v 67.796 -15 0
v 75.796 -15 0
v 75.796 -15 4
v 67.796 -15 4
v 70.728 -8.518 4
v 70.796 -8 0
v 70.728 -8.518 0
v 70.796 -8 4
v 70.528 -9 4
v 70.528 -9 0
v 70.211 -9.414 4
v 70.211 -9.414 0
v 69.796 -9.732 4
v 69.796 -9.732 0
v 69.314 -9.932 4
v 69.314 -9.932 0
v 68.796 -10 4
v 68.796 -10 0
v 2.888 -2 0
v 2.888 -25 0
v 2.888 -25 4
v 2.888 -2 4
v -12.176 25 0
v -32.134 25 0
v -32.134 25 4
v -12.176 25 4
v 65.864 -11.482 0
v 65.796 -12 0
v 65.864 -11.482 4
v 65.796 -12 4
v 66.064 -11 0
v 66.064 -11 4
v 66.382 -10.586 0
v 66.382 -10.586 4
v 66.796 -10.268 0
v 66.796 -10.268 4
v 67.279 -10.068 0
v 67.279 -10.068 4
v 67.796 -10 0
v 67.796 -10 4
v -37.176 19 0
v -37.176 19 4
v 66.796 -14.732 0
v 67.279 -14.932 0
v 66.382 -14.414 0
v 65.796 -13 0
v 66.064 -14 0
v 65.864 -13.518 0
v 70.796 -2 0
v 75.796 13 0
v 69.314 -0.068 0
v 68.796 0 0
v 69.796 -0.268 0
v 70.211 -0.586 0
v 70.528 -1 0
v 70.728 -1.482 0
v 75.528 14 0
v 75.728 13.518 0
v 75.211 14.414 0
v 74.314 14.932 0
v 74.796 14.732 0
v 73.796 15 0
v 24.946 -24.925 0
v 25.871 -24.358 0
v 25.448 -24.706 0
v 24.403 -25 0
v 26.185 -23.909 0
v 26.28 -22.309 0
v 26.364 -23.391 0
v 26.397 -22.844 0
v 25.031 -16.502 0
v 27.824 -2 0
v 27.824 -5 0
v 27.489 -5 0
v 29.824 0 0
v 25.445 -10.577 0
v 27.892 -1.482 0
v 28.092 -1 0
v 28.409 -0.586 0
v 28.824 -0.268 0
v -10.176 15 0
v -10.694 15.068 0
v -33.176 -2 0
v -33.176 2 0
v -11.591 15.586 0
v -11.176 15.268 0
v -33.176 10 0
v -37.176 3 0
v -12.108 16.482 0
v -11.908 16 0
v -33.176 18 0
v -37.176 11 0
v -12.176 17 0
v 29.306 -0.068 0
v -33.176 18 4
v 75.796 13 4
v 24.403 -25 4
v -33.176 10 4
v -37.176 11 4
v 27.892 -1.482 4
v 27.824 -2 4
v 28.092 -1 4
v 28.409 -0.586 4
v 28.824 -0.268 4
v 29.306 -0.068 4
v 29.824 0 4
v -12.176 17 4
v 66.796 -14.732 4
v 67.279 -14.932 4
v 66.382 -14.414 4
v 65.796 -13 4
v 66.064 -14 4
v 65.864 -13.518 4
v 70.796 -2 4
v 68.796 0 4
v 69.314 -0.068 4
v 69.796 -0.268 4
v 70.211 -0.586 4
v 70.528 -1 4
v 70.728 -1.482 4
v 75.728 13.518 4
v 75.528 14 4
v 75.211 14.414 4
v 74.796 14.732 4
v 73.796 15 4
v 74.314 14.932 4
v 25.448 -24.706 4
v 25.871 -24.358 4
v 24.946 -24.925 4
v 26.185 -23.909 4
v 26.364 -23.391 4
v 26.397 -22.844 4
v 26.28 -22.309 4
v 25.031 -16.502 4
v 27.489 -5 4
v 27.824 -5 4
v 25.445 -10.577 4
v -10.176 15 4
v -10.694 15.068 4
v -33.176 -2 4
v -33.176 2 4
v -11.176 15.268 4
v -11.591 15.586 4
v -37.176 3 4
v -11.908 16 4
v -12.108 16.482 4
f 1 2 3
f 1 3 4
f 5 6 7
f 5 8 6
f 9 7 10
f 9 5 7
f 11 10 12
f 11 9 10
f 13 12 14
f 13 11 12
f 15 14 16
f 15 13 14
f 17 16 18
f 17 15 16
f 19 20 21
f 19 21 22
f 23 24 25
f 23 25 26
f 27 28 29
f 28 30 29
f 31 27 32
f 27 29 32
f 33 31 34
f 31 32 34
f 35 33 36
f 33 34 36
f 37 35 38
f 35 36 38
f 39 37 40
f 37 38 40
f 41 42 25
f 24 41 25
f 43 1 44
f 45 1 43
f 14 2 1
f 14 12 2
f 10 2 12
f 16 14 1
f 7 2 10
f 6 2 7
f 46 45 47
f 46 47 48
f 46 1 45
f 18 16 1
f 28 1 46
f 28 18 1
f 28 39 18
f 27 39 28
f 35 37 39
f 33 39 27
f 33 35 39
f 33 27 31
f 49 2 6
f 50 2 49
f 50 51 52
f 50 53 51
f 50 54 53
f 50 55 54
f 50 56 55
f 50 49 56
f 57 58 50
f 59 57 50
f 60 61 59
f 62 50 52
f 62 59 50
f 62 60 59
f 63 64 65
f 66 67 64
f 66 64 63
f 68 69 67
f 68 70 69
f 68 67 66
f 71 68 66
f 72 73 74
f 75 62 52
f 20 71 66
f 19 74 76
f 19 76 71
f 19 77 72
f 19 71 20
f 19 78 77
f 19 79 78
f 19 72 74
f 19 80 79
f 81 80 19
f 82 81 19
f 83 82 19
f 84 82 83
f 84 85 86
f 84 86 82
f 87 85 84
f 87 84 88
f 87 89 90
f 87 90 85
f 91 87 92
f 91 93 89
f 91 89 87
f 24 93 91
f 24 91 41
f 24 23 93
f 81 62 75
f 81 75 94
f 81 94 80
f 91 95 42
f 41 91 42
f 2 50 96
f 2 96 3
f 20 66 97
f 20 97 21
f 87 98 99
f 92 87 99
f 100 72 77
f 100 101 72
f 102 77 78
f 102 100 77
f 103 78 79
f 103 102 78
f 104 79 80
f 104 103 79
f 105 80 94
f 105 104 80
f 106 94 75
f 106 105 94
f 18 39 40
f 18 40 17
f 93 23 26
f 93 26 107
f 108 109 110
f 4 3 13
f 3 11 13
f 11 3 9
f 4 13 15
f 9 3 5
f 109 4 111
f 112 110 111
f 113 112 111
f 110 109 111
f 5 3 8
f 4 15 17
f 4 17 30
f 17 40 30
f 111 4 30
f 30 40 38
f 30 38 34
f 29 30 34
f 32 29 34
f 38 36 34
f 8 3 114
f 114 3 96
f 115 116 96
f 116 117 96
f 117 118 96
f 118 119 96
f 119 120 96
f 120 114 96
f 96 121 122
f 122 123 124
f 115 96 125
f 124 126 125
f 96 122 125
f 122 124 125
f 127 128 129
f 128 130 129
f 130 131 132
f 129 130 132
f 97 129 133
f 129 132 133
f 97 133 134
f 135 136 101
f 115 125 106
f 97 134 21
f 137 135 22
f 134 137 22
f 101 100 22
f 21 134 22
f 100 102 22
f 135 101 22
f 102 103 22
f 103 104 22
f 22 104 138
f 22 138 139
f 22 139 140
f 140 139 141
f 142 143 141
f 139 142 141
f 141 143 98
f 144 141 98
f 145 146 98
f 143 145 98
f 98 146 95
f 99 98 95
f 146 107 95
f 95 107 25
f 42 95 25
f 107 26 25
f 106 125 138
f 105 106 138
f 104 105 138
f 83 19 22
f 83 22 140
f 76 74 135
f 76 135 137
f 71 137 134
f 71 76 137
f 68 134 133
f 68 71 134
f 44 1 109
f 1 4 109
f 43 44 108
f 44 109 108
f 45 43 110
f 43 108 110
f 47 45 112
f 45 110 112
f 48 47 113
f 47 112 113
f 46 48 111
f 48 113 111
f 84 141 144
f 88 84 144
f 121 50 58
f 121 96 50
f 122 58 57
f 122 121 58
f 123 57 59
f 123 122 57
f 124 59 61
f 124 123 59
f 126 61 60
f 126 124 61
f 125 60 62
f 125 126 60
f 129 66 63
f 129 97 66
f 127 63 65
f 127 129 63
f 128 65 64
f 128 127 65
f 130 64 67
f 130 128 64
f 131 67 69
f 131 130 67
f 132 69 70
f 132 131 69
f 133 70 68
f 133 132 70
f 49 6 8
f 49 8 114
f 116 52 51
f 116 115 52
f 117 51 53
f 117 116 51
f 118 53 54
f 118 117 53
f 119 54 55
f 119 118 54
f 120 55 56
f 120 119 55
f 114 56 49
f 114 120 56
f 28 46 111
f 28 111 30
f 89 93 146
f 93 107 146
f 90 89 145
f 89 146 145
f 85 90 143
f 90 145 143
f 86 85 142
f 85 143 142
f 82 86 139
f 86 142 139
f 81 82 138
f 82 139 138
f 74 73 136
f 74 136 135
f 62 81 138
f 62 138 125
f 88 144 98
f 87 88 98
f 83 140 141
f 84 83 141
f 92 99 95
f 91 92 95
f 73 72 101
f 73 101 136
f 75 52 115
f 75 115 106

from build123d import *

# Parameters (mm, degrees)
BOSS_EXTRUDE1_DEPTH = 4
CUT_EXTRUDE1_DEPTH  = 10
FILLET1_R           = 2
FILLET2_R           = 2


with BuildPart() as part:
    # Sketch1 → Boss-Extrude1 (new body)
    with BuildSketch(Plane.XY):
        with BuildLine():
            Line((75.796342278, 15), (75.796342278, -15))
            Line((75.796342278, -15), (65.796342278, -15))
            Line((65.796342278, -15), (65.796342278, -10))
            Line((65.796342278, -10), (70.796342278, -10))
            Line((70.796342278, -10), (70.796342278, 0))
            Line((70.796342278, 0), (27.823693309, 0))
            Line((27.823693309, 0), (27.823693309, -5))
            Line((27.823693309, -5), (27.489306606, -5))
            ThreePointArc((27.489306606, -5), (24.977639534, -15), (27.489306606, -25))
            Line((27.489306606, -25), (2.888005027, -25))
            Line((2.888005027, -25), (2.888005027, -2))
            Line((2.888005027, -2), (-37.176306691, -2))
            Line((-37.176306691, -2), (-37.176306691, 25))
            Line((-37.176306691, 25), (-12.176306691, 25))
            Line((-12.176306691, 25), (-12.176306691, 15))
            Line((-12.176306691, 15), (75.796342278, 15))
        make_face()
    extrude(amount=BOSS_EXTRUDE1_DEPTH)

    # Sketch2 → Cut-Extrude1 (cut)
    with BuildSketch(Plane.XY.offset(4)):
        Polygon((-37.176306691, 19), (-32.133784184, 25), (-32.133784184, 30.908724767), (-39.468083963, 30.908724767), (-39.468083963, -2.242682287), (-33.176306691, -2.242682287), (-33.176306691, 2), (-37.176306691, 3), (-33.176306691, 10), (-37.176306691, 11), (-33.176306691, 18), align=None)
    extrude(amount=-CUT_EXTRUDE1_DEPTH, mode=Mode.SUBTRACT)

    # Fillet1
    fillet1_edges = [part.edges().sort_by_distance(p)[0] for p in [
        (65.796342278, -15, 2),
        (65.796342278, -10, 2),
        (70.796342278, -10, 2),
        (27.489306606, -25, 2),
    ]]
    fillet(fillet1_edges, radius=FILLET1_R)

    # Fillet2
    fillet2_edges = [part.edges().sort_by_distance(p)[0] for p in [
        (75.796342278, 15, 2),
        (70.796342278, 0, 2),
        (27.823693309, 0, 2),
        (-12.176306691, 15, 2),
    ]]
    fillet(fillet2_edges, radius=FILLET2_R)


solid = part.part
